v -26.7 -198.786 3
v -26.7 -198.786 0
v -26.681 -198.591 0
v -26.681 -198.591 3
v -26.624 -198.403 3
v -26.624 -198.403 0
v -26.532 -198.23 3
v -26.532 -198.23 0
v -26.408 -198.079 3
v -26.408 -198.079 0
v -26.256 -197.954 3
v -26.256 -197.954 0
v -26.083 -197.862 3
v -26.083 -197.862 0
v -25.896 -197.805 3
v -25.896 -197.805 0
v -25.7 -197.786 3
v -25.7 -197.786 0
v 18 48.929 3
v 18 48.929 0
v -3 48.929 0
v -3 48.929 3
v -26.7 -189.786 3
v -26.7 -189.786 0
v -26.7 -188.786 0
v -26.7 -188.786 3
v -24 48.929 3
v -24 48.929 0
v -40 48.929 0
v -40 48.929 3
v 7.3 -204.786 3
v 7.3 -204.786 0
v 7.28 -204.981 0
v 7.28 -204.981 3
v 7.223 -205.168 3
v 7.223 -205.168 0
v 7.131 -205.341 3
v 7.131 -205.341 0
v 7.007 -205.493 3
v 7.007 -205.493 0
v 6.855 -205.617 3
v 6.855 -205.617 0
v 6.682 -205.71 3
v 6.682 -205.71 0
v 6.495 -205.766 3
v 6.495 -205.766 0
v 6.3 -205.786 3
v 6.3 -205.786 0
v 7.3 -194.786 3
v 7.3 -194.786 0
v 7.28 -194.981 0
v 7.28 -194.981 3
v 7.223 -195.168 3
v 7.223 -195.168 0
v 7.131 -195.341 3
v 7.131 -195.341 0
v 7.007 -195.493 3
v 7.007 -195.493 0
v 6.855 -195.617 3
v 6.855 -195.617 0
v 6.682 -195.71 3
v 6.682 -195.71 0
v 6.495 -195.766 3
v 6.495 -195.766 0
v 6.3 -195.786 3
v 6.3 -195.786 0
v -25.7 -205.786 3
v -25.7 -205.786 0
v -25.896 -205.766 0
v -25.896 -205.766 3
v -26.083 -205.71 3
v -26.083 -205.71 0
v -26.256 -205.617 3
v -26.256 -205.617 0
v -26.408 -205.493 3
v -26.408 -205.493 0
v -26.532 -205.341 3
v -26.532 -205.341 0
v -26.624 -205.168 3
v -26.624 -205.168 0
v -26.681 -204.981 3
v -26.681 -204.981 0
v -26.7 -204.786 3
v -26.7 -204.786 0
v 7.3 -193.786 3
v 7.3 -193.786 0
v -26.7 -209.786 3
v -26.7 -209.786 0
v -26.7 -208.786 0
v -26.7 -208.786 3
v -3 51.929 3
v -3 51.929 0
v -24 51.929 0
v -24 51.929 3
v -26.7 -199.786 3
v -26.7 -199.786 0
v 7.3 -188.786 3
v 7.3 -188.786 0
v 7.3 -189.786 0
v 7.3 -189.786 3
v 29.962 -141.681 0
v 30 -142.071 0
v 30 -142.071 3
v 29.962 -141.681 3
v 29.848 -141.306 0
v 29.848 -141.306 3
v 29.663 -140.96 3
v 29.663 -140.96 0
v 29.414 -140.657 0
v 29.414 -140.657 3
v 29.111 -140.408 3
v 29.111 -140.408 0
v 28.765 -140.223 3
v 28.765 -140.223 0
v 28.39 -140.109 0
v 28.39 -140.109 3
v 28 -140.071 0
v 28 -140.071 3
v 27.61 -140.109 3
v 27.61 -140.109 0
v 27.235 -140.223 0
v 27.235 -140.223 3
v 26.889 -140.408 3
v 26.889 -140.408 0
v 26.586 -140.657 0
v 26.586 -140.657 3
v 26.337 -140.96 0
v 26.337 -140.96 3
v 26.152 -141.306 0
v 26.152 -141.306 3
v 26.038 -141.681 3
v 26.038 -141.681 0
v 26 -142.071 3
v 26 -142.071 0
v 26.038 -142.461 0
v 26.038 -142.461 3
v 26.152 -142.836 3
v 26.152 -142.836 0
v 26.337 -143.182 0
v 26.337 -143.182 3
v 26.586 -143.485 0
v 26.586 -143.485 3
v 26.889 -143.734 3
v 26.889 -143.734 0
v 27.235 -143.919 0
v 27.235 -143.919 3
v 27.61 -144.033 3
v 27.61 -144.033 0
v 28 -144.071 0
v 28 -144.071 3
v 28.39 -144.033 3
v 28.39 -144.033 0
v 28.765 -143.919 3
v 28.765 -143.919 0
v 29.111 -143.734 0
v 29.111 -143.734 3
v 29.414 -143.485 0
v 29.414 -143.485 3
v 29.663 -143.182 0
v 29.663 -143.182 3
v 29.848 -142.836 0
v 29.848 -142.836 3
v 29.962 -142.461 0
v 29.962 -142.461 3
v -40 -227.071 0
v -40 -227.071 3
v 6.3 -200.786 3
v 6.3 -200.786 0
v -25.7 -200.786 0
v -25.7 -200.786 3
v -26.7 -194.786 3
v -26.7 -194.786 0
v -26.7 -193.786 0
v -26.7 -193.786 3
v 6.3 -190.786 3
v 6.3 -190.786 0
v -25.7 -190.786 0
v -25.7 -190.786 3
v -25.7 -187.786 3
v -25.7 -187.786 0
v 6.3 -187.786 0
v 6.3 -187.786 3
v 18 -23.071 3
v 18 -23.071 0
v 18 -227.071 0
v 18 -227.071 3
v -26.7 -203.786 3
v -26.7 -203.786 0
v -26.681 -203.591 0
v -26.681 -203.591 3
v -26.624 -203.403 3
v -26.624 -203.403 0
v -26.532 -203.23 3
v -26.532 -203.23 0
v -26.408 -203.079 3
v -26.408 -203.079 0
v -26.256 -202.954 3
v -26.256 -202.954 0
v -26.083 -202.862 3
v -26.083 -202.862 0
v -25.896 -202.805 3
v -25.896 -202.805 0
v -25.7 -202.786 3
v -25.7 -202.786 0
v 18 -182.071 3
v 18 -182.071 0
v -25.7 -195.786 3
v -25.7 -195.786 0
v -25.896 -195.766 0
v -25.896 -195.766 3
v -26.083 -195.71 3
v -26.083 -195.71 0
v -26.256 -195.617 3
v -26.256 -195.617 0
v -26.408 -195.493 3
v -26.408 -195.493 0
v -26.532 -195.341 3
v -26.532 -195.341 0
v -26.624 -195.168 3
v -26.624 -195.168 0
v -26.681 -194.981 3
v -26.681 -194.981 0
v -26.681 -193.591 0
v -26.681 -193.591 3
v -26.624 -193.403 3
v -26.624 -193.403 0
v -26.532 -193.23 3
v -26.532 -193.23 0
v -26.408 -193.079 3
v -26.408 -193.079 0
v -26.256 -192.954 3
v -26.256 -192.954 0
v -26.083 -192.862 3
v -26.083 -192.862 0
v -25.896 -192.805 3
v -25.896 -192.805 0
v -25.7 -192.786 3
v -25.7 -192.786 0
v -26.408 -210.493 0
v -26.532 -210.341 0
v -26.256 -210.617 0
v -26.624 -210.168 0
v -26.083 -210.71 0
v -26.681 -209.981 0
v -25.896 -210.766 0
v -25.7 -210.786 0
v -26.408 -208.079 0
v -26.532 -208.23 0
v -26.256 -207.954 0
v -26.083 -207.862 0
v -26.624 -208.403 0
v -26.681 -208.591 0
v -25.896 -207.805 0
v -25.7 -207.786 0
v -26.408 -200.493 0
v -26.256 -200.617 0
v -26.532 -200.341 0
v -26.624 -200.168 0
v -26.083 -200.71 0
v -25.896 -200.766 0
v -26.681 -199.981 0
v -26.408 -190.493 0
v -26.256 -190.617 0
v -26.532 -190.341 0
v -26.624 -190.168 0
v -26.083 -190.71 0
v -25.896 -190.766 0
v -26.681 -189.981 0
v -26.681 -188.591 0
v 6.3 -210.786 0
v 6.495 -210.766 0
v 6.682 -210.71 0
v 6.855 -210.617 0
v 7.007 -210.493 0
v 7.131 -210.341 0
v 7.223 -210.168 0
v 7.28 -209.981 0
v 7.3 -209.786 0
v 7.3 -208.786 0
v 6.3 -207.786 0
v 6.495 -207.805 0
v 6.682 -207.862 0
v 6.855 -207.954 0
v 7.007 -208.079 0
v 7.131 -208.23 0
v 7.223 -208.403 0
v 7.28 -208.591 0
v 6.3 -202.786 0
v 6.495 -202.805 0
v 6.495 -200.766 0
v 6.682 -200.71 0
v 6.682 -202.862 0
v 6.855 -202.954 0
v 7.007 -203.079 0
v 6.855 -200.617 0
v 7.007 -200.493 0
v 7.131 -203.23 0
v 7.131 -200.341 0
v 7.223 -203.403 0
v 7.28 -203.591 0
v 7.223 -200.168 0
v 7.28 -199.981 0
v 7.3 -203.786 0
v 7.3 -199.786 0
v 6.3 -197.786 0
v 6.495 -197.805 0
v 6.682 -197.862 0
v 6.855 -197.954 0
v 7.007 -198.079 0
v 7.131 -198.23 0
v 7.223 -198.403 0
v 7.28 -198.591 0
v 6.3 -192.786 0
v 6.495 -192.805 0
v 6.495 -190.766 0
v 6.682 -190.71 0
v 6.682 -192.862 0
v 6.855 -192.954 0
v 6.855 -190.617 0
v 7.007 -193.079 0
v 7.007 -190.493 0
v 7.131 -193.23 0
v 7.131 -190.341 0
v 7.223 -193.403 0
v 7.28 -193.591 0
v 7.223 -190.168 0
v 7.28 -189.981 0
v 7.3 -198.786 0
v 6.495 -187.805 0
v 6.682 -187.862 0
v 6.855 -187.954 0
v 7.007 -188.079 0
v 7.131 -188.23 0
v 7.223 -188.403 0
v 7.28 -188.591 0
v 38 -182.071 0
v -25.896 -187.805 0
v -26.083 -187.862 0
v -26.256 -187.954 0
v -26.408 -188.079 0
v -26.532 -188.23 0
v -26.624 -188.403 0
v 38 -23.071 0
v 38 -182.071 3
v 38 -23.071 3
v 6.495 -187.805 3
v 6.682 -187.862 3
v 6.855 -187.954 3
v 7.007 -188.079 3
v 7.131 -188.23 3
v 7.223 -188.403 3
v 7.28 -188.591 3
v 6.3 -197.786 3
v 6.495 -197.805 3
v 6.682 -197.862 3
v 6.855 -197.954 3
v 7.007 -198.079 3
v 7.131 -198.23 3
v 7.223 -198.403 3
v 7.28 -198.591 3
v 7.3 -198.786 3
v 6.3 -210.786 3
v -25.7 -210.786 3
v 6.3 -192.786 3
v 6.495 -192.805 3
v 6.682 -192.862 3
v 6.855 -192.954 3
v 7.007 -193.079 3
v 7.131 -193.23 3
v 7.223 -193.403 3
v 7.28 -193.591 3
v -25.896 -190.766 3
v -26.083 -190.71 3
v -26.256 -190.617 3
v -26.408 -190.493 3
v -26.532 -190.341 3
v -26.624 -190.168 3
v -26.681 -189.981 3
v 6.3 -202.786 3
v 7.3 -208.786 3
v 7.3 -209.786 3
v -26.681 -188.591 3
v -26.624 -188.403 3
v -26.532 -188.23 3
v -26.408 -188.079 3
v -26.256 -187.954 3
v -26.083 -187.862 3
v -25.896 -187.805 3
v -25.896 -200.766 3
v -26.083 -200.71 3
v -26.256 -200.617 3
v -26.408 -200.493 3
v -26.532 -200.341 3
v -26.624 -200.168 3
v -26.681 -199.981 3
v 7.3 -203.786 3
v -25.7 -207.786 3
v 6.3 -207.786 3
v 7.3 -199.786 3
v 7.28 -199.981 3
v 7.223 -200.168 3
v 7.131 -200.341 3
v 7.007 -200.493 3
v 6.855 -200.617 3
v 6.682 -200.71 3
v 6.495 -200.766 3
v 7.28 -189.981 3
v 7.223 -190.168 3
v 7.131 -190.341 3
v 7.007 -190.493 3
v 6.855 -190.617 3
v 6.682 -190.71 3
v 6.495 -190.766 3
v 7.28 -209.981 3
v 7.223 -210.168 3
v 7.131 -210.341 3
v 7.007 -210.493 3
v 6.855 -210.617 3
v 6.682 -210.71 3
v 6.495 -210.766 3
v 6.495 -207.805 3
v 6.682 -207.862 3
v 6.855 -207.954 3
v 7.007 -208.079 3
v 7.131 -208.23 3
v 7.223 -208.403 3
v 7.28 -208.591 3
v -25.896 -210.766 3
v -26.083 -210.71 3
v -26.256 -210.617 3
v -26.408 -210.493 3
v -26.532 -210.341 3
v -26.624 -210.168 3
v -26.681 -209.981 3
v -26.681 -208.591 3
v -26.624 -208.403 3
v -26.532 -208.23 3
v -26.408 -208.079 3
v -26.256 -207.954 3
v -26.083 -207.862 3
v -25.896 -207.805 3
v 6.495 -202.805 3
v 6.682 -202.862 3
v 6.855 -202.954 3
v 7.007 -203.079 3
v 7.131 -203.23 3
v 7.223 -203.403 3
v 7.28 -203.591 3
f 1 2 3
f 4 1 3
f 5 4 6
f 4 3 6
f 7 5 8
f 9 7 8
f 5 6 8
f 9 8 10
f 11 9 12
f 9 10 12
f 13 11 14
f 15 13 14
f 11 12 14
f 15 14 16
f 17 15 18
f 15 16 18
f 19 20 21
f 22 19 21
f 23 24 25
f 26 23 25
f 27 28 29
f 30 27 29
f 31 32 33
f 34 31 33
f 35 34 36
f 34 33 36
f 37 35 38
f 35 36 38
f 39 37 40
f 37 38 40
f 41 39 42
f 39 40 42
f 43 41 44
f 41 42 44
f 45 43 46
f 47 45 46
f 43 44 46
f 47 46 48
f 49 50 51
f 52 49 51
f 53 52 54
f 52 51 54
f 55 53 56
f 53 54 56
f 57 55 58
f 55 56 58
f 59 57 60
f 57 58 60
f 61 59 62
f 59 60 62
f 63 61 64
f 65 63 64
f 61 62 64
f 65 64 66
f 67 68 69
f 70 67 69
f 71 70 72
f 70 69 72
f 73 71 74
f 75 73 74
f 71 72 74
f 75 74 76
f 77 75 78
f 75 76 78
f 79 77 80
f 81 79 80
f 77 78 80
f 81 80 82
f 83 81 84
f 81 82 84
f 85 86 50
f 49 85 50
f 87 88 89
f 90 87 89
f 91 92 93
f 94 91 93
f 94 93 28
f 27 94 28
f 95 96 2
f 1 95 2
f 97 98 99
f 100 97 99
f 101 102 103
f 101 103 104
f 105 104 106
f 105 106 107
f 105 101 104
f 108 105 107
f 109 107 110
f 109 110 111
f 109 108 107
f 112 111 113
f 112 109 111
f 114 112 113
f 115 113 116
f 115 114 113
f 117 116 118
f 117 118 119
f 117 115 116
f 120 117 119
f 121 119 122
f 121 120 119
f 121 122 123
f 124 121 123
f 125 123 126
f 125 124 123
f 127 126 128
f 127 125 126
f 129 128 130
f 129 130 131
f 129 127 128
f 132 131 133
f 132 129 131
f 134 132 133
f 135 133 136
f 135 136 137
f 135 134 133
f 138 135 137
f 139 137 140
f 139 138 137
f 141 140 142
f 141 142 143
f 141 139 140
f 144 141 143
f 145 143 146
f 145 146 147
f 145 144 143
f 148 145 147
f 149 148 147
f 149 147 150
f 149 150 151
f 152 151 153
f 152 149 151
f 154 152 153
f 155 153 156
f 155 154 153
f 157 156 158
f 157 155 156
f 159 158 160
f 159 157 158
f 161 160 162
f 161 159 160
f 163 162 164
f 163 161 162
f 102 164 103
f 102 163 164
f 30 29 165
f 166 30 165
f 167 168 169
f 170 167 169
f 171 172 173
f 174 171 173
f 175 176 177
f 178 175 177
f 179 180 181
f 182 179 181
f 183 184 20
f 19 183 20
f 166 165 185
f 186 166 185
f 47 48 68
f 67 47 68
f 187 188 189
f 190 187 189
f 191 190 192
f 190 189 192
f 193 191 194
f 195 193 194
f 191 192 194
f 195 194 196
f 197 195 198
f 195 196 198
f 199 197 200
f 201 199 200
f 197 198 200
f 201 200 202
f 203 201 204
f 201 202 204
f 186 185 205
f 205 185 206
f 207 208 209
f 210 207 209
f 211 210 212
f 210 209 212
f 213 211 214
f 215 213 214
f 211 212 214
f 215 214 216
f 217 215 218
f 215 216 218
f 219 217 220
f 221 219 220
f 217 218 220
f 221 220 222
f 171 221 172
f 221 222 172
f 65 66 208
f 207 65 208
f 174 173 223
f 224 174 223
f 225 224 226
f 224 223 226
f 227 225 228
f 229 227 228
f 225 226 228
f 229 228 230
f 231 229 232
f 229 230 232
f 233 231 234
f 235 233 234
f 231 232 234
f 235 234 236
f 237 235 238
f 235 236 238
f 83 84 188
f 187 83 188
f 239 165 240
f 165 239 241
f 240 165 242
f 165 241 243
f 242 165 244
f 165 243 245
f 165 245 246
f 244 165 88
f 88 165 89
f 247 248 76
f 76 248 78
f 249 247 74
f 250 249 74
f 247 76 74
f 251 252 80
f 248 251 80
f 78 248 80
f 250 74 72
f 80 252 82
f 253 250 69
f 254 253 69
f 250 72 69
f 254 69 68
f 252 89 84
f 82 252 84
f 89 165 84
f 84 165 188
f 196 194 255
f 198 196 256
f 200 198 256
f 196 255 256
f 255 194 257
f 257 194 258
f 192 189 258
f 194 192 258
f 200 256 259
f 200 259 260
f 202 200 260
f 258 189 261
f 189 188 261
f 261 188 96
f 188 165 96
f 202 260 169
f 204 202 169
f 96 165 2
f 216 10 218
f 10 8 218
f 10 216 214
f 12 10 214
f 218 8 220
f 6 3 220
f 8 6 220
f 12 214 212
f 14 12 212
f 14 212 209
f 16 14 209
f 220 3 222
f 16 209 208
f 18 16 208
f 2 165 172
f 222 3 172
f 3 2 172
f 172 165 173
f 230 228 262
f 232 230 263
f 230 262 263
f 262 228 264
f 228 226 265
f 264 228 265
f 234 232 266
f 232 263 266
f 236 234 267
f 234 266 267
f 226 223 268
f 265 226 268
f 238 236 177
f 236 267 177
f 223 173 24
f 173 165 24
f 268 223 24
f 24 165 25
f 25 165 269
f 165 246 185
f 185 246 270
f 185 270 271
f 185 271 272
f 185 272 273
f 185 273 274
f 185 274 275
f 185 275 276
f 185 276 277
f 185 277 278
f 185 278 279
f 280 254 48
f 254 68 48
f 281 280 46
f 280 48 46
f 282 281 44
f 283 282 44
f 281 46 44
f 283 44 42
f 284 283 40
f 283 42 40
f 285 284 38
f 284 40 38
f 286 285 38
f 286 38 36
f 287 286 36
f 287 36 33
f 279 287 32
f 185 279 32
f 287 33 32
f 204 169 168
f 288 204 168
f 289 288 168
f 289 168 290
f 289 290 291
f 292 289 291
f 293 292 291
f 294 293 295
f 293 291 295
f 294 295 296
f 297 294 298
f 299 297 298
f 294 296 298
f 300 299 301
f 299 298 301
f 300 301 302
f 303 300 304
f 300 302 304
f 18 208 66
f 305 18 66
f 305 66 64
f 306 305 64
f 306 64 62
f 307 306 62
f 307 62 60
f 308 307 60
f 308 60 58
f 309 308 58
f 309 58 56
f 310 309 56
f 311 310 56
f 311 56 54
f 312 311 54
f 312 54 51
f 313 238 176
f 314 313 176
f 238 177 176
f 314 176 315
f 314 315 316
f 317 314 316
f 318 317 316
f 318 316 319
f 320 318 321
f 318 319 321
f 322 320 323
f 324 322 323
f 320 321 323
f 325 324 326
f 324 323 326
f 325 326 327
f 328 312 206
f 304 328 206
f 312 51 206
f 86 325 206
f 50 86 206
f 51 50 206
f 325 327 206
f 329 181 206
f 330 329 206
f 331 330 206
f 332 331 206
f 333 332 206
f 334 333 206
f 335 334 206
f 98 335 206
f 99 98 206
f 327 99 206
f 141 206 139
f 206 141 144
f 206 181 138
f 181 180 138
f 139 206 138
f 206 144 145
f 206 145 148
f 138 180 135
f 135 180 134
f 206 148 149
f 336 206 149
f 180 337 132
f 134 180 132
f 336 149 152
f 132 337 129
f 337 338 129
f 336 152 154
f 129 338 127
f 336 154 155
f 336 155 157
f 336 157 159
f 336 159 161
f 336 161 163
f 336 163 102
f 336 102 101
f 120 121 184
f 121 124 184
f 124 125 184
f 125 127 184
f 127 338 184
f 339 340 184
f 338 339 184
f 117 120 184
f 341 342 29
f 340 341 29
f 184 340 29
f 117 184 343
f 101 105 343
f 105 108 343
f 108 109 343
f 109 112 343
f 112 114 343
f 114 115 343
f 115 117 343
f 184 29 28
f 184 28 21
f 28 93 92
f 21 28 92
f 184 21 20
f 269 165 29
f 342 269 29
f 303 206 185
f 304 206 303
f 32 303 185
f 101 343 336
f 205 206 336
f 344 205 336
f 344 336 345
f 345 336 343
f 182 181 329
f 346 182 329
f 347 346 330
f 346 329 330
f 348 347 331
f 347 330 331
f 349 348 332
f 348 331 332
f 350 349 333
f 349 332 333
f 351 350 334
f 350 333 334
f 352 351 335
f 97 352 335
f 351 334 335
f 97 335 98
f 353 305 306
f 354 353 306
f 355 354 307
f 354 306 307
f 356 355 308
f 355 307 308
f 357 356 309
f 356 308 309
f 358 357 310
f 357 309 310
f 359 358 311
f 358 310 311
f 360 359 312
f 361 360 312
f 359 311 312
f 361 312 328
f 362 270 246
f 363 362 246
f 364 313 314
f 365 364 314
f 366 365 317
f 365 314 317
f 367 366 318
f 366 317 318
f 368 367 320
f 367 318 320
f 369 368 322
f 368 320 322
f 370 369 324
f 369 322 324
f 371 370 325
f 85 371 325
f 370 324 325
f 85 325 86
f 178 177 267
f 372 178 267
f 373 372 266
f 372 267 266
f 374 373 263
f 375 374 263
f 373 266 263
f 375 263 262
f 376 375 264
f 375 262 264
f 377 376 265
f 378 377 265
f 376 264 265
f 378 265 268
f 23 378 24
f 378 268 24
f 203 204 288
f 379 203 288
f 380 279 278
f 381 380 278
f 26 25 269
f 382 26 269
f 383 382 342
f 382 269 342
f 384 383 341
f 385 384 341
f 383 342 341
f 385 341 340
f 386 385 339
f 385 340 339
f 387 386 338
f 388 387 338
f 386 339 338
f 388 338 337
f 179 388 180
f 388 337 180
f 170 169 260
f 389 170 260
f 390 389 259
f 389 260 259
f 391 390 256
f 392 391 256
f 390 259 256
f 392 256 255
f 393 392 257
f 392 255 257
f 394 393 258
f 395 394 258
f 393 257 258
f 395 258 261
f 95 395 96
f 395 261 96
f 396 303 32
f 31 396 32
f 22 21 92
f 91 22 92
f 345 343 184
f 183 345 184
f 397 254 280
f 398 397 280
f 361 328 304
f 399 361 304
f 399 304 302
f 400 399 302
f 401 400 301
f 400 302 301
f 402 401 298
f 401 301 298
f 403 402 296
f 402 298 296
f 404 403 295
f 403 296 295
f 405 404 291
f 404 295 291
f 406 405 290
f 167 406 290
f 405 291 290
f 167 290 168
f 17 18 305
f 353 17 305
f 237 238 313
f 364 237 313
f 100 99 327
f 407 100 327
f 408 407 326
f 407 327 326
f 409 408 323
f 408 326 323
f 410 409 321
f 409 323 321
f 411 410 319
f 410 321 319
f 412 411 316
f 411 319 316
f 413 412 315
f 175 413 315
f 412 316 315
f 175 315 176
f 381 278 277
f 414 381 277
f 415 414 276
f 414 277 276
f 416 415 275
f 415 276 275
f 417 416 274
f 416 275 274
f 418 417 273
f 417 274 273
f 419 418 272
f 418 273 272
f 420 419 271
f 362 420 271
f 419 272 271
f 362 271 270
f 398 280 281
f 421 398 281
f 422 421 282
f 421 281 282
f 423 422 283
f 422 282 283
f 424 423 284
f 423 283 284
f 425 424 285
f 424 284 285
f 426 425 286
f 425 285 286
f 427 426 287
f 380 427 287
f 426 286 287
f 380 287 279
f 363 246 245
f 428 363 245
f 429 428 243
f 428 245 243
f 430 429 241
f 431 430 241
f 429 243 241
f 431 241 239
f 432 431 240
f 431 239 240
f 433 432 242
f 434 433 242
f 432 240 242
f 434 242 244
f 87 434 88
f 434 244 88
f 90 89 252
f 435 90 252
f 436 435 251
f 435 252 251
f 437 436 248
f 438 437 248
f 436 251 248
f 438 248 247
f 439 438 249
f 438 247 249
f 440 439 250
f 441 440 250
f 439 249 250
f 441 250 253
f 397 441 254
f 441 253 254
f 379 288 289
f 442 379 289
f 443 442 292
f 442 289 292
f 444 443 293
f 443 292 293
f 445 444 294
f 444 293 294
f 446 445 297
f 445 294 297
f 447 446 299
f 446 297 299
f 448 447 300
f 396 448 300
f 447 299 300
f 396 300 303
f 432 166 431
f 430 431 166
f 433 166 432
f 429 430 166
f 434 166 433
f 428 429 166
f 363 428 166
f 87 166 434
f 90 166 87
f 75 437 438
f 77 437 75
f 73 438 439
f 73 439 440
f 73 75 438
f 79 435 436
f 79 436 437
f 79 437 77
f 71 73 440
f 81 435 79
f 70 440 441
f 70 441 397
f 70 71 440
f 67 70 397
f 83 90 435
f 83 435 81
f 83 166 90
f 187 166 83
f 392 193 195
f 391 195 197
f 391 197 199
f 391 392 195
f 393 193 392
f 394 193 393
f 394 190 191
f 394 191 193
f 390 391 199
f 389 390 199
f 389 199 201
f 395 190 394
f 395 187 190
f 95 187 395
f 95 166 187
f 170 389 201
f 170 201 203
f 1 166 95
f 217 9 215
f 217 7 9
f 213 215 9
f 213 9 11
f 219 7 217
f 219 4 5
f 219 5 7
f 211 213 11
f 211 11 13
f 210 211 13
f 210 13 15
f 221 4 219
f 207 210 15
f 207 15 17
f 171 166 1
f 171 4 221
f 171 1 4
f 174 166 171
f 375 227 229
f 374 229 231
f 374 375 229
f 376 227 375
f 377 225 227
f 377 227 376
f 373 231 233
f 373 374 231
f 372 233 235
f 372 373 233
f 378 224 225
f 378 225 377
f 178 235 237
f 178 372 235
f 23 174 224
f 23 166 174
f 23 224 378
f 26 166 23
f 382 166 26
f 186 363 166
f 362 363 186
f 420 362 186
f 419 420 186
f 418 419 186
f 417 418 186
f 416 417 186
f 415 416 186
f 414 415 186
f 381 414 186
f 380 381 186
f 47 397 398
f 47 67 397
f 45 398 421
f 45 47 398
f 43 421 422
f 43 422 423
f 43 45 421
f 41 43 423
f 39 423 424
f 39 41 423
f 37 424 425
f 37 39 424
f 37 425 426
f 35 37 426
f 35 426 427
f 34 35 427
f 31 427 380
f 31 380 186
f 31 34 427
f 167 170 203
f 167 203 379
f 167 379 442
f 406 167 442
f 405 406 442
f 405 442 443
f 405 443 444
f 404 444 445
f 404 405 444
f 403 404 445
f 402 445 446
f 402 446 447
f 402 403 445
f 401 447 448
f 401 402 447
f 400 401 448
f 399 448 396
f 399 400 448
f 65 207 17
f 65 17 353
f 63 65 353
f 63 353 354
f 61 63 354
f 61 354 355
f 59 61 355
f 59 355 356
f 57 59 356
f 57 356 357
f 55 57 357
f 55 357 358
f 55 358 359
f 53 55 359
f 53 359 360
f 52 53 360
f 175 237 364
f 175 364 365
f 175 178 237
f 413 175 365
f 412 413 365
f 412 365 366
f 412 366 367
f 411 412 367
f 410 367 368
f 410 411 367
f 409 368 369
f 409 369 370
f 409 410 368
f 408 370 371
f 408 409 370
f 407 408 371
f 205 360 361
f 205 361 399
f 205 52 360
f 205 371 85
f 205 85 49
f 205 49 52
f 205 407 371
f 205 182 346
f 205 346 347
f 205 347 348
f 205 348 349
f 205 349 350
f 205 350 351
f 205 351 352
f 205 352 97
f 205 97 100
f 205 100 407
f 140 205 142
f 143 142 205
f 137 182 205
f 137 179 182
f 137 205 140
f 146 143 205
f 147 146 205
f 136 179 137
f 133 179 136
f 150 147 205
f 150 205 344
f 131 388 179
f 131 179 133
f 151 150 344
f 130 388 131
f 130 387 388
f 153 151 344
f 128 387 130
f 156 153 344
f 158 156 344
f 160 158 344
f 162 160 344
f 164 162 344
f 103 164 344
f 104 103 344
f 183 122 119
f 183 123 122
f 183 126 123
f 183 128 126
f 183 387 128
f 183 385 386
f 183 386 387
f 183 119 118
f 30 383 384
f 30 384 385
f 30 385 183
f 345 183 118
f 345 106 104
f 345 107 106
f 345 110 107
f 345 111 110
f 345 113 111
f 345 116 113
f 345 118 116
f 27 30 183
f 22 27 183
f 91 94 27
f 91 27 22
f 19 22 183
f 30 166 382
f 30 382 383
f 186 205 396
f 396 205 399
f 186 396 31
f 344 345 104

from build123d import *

# Parameters (mm, degrees)
SKETCH1_R           = 2
BOSS_EXTRUDE1_DEPTH = 3


with BuildPart() as part:
    # Sketch1 → Boss-Extrude1 (new body)
    with BuildSketch(Plane.XY):
        Polygon((18, -23.070954543), (18, 48.929045457), (-3, 48.929045457), (-3, 51.929045457), (-24, 51.929045457), (-24, 48.929045457), (-40, 48.929045457), (-40, -227.070954543), (18, -227.070954543), (18, -182.070954543), (38, -182.070954543), (38, -23.070954543), align=None)
        with BuildLine():
            Line((-25.70047512, -207.785634012), (6.29952488, -207.785634012))
            ThreePointArc((6.29952488, -207.785634012), (7.006631662, -208.078527231), (7.29952488, -208.785634012))
            Line((7.29952488, -208.785634012), (7.29952488, -209.785634012))
            ThreePointArc((7.29952488, -209.785634012), (7.006631662, -210.492740793), (6.29952488, -210.785634012))
            Line((6.29952488, -210.785634012), (-25.70047512, -210.785634012))
            ThreePointArc((-25.70047512, -210.785634012), (-26.407581901, -210.492740793), (-26.70047512, -209.785634012))
            Line((-26.70047512, -209.785634012), (-26.70047512, -208.785634012))
            ThreePointArc((-26.70047512, -208.785634012), (-26.407581901, -208.078527231), (-25.70047512, -207.785634012))
        make_face(mode=Mode.SUBTRACT)
        with BuildLine():
            Line((-25.70047512, -202.785634012), (6.29952488, -202.785634012))
            ThreePointArc((6.29952488, -202.785634012), (7.006631662, -203.078527231), (7.29952488, -203.785634012))
            Line((7.29952488, -203.785634012), (7.29952488, -204.785634012))
            ThreePointArc((7.29952488, -204.785634012), (7.006631662, -205.492740793), (6.29952488, -205.785634012))
            Line((6.29952488, -205.785634012), (-25.70047512, -205.785634012))
            ThreePointArc((-25.70047512, -205.785634012), (-26.407581901, -205.492740793), (-26.70047512, -204.785634012))
            Line((-26.70047512, -204.785634012), (-26.70047512, -203.785634012))
            ThreePointArc((-26.70047512, -203.785634012), (-26.407581901, -203.078527231), (-25.70047512, -202.785634012))
        make_face(mode=Mode.SUBTRACT)
        with BuildLine():
            Line((-25.70047512, -197.785634012), (6.29952488, -197.785634012))
            ThreePointArc((6.29952488, -197.785634012), (7.006631662, -198.078527231), (7.29952488, -198.785634012))
            Line((7.29952488, -198.785634012), (7.29952488, -199.785634012))
            ThreePointArc((7.29952488, -199.785634012), (7.006631662, -200.492740793), (6.29952488, -200.785634012))
            Line((6.29952488, -200.785634012), (-25.70047512, -200.785634012))
            ThreePointArc((-25.70047512, -200.785634012), (-26.407581901, -200.492740793), (-26.70047512, -199.785634012))
            Line((-26.70047512, -199.785634012), (-26.70047512, -198.785634012))
            ThreePointArc((-26.70047512, -198.785634012), (-26.407581901, -198.078527231), (-25.70047512, -197.785634012))
        make_face(mode=Mode.SUBTRACT)
        with BuildLine():
            Line((-25.70047512, -192.785634012), (6.29952488, -192.785634012))
            ThreePointArc((6.29952488, -192.785634012), (7.006631662, -193.078527231), (7.29952488, -193.785634012))
            Line((7.29952488, -193.785634012), (7.29952488, -194.785634012))
            ThreePointArc((7.29952488, -194.785634012), (7.006631662, -195.492740793), (6.29952488, -195.785634012))
            Line((6.29952488, -195.785634012), (-25.70047512, -195.785634012))
            ThreePointArc((-25.70047512, -195.785634012), (-26.407581901, -195.492740793), (-26.70047512, -194.785634012))
            Line((-26.70047512, -194.785634012), (-26.70047512, -193.785634012))
            ThreePointArc((-26.70047512, -193.785634012), (-26.407581901, -193.078527231), (-25.70047512, -192.785634012))
        make_face(mode=Mode.SUBTRACT)
        with BuildLine():
            Line((-25.70047512, -187.785634012), (6.29952488, -187.785634012))
            ThreePointArc((6.29952488, -187.785634012), (7.006631662, -188.078527231), (7.29952488, -188.785634012))
            Line((7.29952488, -188.785634012), (7.29952488, -189.785634012))
            ThreePointArc((7.29952488, -189.785634012), (7.006631662, -190.492740793), (6.29952488, -190.785634012))
            Line((6.29952488, -190.785634012), (-25.70047512, -190.785634012))
            ThreePointArc((-25.70047512, -190.785634012), (-26.407581901, -190.492740793), (-26.70047512, -189.785634012))
            Line((-26.70047512, -189.785634012), (-26.70047512, -188.785634012))
            ThreePointArc((-26.70047512, -188.785634012), (-26.407581901, -188.078527231), (-25.70047512, -187.785634012))
        make_face(mode=Mode.SUBTRACT)
        with Locations((28, -142.070954543)):
            Circle(SKETCH1_R, mode=Mode.SUBTRACT)
    extrude(amount=BOSS_EXTRUDE1_DEPTH)


solid = part.part
